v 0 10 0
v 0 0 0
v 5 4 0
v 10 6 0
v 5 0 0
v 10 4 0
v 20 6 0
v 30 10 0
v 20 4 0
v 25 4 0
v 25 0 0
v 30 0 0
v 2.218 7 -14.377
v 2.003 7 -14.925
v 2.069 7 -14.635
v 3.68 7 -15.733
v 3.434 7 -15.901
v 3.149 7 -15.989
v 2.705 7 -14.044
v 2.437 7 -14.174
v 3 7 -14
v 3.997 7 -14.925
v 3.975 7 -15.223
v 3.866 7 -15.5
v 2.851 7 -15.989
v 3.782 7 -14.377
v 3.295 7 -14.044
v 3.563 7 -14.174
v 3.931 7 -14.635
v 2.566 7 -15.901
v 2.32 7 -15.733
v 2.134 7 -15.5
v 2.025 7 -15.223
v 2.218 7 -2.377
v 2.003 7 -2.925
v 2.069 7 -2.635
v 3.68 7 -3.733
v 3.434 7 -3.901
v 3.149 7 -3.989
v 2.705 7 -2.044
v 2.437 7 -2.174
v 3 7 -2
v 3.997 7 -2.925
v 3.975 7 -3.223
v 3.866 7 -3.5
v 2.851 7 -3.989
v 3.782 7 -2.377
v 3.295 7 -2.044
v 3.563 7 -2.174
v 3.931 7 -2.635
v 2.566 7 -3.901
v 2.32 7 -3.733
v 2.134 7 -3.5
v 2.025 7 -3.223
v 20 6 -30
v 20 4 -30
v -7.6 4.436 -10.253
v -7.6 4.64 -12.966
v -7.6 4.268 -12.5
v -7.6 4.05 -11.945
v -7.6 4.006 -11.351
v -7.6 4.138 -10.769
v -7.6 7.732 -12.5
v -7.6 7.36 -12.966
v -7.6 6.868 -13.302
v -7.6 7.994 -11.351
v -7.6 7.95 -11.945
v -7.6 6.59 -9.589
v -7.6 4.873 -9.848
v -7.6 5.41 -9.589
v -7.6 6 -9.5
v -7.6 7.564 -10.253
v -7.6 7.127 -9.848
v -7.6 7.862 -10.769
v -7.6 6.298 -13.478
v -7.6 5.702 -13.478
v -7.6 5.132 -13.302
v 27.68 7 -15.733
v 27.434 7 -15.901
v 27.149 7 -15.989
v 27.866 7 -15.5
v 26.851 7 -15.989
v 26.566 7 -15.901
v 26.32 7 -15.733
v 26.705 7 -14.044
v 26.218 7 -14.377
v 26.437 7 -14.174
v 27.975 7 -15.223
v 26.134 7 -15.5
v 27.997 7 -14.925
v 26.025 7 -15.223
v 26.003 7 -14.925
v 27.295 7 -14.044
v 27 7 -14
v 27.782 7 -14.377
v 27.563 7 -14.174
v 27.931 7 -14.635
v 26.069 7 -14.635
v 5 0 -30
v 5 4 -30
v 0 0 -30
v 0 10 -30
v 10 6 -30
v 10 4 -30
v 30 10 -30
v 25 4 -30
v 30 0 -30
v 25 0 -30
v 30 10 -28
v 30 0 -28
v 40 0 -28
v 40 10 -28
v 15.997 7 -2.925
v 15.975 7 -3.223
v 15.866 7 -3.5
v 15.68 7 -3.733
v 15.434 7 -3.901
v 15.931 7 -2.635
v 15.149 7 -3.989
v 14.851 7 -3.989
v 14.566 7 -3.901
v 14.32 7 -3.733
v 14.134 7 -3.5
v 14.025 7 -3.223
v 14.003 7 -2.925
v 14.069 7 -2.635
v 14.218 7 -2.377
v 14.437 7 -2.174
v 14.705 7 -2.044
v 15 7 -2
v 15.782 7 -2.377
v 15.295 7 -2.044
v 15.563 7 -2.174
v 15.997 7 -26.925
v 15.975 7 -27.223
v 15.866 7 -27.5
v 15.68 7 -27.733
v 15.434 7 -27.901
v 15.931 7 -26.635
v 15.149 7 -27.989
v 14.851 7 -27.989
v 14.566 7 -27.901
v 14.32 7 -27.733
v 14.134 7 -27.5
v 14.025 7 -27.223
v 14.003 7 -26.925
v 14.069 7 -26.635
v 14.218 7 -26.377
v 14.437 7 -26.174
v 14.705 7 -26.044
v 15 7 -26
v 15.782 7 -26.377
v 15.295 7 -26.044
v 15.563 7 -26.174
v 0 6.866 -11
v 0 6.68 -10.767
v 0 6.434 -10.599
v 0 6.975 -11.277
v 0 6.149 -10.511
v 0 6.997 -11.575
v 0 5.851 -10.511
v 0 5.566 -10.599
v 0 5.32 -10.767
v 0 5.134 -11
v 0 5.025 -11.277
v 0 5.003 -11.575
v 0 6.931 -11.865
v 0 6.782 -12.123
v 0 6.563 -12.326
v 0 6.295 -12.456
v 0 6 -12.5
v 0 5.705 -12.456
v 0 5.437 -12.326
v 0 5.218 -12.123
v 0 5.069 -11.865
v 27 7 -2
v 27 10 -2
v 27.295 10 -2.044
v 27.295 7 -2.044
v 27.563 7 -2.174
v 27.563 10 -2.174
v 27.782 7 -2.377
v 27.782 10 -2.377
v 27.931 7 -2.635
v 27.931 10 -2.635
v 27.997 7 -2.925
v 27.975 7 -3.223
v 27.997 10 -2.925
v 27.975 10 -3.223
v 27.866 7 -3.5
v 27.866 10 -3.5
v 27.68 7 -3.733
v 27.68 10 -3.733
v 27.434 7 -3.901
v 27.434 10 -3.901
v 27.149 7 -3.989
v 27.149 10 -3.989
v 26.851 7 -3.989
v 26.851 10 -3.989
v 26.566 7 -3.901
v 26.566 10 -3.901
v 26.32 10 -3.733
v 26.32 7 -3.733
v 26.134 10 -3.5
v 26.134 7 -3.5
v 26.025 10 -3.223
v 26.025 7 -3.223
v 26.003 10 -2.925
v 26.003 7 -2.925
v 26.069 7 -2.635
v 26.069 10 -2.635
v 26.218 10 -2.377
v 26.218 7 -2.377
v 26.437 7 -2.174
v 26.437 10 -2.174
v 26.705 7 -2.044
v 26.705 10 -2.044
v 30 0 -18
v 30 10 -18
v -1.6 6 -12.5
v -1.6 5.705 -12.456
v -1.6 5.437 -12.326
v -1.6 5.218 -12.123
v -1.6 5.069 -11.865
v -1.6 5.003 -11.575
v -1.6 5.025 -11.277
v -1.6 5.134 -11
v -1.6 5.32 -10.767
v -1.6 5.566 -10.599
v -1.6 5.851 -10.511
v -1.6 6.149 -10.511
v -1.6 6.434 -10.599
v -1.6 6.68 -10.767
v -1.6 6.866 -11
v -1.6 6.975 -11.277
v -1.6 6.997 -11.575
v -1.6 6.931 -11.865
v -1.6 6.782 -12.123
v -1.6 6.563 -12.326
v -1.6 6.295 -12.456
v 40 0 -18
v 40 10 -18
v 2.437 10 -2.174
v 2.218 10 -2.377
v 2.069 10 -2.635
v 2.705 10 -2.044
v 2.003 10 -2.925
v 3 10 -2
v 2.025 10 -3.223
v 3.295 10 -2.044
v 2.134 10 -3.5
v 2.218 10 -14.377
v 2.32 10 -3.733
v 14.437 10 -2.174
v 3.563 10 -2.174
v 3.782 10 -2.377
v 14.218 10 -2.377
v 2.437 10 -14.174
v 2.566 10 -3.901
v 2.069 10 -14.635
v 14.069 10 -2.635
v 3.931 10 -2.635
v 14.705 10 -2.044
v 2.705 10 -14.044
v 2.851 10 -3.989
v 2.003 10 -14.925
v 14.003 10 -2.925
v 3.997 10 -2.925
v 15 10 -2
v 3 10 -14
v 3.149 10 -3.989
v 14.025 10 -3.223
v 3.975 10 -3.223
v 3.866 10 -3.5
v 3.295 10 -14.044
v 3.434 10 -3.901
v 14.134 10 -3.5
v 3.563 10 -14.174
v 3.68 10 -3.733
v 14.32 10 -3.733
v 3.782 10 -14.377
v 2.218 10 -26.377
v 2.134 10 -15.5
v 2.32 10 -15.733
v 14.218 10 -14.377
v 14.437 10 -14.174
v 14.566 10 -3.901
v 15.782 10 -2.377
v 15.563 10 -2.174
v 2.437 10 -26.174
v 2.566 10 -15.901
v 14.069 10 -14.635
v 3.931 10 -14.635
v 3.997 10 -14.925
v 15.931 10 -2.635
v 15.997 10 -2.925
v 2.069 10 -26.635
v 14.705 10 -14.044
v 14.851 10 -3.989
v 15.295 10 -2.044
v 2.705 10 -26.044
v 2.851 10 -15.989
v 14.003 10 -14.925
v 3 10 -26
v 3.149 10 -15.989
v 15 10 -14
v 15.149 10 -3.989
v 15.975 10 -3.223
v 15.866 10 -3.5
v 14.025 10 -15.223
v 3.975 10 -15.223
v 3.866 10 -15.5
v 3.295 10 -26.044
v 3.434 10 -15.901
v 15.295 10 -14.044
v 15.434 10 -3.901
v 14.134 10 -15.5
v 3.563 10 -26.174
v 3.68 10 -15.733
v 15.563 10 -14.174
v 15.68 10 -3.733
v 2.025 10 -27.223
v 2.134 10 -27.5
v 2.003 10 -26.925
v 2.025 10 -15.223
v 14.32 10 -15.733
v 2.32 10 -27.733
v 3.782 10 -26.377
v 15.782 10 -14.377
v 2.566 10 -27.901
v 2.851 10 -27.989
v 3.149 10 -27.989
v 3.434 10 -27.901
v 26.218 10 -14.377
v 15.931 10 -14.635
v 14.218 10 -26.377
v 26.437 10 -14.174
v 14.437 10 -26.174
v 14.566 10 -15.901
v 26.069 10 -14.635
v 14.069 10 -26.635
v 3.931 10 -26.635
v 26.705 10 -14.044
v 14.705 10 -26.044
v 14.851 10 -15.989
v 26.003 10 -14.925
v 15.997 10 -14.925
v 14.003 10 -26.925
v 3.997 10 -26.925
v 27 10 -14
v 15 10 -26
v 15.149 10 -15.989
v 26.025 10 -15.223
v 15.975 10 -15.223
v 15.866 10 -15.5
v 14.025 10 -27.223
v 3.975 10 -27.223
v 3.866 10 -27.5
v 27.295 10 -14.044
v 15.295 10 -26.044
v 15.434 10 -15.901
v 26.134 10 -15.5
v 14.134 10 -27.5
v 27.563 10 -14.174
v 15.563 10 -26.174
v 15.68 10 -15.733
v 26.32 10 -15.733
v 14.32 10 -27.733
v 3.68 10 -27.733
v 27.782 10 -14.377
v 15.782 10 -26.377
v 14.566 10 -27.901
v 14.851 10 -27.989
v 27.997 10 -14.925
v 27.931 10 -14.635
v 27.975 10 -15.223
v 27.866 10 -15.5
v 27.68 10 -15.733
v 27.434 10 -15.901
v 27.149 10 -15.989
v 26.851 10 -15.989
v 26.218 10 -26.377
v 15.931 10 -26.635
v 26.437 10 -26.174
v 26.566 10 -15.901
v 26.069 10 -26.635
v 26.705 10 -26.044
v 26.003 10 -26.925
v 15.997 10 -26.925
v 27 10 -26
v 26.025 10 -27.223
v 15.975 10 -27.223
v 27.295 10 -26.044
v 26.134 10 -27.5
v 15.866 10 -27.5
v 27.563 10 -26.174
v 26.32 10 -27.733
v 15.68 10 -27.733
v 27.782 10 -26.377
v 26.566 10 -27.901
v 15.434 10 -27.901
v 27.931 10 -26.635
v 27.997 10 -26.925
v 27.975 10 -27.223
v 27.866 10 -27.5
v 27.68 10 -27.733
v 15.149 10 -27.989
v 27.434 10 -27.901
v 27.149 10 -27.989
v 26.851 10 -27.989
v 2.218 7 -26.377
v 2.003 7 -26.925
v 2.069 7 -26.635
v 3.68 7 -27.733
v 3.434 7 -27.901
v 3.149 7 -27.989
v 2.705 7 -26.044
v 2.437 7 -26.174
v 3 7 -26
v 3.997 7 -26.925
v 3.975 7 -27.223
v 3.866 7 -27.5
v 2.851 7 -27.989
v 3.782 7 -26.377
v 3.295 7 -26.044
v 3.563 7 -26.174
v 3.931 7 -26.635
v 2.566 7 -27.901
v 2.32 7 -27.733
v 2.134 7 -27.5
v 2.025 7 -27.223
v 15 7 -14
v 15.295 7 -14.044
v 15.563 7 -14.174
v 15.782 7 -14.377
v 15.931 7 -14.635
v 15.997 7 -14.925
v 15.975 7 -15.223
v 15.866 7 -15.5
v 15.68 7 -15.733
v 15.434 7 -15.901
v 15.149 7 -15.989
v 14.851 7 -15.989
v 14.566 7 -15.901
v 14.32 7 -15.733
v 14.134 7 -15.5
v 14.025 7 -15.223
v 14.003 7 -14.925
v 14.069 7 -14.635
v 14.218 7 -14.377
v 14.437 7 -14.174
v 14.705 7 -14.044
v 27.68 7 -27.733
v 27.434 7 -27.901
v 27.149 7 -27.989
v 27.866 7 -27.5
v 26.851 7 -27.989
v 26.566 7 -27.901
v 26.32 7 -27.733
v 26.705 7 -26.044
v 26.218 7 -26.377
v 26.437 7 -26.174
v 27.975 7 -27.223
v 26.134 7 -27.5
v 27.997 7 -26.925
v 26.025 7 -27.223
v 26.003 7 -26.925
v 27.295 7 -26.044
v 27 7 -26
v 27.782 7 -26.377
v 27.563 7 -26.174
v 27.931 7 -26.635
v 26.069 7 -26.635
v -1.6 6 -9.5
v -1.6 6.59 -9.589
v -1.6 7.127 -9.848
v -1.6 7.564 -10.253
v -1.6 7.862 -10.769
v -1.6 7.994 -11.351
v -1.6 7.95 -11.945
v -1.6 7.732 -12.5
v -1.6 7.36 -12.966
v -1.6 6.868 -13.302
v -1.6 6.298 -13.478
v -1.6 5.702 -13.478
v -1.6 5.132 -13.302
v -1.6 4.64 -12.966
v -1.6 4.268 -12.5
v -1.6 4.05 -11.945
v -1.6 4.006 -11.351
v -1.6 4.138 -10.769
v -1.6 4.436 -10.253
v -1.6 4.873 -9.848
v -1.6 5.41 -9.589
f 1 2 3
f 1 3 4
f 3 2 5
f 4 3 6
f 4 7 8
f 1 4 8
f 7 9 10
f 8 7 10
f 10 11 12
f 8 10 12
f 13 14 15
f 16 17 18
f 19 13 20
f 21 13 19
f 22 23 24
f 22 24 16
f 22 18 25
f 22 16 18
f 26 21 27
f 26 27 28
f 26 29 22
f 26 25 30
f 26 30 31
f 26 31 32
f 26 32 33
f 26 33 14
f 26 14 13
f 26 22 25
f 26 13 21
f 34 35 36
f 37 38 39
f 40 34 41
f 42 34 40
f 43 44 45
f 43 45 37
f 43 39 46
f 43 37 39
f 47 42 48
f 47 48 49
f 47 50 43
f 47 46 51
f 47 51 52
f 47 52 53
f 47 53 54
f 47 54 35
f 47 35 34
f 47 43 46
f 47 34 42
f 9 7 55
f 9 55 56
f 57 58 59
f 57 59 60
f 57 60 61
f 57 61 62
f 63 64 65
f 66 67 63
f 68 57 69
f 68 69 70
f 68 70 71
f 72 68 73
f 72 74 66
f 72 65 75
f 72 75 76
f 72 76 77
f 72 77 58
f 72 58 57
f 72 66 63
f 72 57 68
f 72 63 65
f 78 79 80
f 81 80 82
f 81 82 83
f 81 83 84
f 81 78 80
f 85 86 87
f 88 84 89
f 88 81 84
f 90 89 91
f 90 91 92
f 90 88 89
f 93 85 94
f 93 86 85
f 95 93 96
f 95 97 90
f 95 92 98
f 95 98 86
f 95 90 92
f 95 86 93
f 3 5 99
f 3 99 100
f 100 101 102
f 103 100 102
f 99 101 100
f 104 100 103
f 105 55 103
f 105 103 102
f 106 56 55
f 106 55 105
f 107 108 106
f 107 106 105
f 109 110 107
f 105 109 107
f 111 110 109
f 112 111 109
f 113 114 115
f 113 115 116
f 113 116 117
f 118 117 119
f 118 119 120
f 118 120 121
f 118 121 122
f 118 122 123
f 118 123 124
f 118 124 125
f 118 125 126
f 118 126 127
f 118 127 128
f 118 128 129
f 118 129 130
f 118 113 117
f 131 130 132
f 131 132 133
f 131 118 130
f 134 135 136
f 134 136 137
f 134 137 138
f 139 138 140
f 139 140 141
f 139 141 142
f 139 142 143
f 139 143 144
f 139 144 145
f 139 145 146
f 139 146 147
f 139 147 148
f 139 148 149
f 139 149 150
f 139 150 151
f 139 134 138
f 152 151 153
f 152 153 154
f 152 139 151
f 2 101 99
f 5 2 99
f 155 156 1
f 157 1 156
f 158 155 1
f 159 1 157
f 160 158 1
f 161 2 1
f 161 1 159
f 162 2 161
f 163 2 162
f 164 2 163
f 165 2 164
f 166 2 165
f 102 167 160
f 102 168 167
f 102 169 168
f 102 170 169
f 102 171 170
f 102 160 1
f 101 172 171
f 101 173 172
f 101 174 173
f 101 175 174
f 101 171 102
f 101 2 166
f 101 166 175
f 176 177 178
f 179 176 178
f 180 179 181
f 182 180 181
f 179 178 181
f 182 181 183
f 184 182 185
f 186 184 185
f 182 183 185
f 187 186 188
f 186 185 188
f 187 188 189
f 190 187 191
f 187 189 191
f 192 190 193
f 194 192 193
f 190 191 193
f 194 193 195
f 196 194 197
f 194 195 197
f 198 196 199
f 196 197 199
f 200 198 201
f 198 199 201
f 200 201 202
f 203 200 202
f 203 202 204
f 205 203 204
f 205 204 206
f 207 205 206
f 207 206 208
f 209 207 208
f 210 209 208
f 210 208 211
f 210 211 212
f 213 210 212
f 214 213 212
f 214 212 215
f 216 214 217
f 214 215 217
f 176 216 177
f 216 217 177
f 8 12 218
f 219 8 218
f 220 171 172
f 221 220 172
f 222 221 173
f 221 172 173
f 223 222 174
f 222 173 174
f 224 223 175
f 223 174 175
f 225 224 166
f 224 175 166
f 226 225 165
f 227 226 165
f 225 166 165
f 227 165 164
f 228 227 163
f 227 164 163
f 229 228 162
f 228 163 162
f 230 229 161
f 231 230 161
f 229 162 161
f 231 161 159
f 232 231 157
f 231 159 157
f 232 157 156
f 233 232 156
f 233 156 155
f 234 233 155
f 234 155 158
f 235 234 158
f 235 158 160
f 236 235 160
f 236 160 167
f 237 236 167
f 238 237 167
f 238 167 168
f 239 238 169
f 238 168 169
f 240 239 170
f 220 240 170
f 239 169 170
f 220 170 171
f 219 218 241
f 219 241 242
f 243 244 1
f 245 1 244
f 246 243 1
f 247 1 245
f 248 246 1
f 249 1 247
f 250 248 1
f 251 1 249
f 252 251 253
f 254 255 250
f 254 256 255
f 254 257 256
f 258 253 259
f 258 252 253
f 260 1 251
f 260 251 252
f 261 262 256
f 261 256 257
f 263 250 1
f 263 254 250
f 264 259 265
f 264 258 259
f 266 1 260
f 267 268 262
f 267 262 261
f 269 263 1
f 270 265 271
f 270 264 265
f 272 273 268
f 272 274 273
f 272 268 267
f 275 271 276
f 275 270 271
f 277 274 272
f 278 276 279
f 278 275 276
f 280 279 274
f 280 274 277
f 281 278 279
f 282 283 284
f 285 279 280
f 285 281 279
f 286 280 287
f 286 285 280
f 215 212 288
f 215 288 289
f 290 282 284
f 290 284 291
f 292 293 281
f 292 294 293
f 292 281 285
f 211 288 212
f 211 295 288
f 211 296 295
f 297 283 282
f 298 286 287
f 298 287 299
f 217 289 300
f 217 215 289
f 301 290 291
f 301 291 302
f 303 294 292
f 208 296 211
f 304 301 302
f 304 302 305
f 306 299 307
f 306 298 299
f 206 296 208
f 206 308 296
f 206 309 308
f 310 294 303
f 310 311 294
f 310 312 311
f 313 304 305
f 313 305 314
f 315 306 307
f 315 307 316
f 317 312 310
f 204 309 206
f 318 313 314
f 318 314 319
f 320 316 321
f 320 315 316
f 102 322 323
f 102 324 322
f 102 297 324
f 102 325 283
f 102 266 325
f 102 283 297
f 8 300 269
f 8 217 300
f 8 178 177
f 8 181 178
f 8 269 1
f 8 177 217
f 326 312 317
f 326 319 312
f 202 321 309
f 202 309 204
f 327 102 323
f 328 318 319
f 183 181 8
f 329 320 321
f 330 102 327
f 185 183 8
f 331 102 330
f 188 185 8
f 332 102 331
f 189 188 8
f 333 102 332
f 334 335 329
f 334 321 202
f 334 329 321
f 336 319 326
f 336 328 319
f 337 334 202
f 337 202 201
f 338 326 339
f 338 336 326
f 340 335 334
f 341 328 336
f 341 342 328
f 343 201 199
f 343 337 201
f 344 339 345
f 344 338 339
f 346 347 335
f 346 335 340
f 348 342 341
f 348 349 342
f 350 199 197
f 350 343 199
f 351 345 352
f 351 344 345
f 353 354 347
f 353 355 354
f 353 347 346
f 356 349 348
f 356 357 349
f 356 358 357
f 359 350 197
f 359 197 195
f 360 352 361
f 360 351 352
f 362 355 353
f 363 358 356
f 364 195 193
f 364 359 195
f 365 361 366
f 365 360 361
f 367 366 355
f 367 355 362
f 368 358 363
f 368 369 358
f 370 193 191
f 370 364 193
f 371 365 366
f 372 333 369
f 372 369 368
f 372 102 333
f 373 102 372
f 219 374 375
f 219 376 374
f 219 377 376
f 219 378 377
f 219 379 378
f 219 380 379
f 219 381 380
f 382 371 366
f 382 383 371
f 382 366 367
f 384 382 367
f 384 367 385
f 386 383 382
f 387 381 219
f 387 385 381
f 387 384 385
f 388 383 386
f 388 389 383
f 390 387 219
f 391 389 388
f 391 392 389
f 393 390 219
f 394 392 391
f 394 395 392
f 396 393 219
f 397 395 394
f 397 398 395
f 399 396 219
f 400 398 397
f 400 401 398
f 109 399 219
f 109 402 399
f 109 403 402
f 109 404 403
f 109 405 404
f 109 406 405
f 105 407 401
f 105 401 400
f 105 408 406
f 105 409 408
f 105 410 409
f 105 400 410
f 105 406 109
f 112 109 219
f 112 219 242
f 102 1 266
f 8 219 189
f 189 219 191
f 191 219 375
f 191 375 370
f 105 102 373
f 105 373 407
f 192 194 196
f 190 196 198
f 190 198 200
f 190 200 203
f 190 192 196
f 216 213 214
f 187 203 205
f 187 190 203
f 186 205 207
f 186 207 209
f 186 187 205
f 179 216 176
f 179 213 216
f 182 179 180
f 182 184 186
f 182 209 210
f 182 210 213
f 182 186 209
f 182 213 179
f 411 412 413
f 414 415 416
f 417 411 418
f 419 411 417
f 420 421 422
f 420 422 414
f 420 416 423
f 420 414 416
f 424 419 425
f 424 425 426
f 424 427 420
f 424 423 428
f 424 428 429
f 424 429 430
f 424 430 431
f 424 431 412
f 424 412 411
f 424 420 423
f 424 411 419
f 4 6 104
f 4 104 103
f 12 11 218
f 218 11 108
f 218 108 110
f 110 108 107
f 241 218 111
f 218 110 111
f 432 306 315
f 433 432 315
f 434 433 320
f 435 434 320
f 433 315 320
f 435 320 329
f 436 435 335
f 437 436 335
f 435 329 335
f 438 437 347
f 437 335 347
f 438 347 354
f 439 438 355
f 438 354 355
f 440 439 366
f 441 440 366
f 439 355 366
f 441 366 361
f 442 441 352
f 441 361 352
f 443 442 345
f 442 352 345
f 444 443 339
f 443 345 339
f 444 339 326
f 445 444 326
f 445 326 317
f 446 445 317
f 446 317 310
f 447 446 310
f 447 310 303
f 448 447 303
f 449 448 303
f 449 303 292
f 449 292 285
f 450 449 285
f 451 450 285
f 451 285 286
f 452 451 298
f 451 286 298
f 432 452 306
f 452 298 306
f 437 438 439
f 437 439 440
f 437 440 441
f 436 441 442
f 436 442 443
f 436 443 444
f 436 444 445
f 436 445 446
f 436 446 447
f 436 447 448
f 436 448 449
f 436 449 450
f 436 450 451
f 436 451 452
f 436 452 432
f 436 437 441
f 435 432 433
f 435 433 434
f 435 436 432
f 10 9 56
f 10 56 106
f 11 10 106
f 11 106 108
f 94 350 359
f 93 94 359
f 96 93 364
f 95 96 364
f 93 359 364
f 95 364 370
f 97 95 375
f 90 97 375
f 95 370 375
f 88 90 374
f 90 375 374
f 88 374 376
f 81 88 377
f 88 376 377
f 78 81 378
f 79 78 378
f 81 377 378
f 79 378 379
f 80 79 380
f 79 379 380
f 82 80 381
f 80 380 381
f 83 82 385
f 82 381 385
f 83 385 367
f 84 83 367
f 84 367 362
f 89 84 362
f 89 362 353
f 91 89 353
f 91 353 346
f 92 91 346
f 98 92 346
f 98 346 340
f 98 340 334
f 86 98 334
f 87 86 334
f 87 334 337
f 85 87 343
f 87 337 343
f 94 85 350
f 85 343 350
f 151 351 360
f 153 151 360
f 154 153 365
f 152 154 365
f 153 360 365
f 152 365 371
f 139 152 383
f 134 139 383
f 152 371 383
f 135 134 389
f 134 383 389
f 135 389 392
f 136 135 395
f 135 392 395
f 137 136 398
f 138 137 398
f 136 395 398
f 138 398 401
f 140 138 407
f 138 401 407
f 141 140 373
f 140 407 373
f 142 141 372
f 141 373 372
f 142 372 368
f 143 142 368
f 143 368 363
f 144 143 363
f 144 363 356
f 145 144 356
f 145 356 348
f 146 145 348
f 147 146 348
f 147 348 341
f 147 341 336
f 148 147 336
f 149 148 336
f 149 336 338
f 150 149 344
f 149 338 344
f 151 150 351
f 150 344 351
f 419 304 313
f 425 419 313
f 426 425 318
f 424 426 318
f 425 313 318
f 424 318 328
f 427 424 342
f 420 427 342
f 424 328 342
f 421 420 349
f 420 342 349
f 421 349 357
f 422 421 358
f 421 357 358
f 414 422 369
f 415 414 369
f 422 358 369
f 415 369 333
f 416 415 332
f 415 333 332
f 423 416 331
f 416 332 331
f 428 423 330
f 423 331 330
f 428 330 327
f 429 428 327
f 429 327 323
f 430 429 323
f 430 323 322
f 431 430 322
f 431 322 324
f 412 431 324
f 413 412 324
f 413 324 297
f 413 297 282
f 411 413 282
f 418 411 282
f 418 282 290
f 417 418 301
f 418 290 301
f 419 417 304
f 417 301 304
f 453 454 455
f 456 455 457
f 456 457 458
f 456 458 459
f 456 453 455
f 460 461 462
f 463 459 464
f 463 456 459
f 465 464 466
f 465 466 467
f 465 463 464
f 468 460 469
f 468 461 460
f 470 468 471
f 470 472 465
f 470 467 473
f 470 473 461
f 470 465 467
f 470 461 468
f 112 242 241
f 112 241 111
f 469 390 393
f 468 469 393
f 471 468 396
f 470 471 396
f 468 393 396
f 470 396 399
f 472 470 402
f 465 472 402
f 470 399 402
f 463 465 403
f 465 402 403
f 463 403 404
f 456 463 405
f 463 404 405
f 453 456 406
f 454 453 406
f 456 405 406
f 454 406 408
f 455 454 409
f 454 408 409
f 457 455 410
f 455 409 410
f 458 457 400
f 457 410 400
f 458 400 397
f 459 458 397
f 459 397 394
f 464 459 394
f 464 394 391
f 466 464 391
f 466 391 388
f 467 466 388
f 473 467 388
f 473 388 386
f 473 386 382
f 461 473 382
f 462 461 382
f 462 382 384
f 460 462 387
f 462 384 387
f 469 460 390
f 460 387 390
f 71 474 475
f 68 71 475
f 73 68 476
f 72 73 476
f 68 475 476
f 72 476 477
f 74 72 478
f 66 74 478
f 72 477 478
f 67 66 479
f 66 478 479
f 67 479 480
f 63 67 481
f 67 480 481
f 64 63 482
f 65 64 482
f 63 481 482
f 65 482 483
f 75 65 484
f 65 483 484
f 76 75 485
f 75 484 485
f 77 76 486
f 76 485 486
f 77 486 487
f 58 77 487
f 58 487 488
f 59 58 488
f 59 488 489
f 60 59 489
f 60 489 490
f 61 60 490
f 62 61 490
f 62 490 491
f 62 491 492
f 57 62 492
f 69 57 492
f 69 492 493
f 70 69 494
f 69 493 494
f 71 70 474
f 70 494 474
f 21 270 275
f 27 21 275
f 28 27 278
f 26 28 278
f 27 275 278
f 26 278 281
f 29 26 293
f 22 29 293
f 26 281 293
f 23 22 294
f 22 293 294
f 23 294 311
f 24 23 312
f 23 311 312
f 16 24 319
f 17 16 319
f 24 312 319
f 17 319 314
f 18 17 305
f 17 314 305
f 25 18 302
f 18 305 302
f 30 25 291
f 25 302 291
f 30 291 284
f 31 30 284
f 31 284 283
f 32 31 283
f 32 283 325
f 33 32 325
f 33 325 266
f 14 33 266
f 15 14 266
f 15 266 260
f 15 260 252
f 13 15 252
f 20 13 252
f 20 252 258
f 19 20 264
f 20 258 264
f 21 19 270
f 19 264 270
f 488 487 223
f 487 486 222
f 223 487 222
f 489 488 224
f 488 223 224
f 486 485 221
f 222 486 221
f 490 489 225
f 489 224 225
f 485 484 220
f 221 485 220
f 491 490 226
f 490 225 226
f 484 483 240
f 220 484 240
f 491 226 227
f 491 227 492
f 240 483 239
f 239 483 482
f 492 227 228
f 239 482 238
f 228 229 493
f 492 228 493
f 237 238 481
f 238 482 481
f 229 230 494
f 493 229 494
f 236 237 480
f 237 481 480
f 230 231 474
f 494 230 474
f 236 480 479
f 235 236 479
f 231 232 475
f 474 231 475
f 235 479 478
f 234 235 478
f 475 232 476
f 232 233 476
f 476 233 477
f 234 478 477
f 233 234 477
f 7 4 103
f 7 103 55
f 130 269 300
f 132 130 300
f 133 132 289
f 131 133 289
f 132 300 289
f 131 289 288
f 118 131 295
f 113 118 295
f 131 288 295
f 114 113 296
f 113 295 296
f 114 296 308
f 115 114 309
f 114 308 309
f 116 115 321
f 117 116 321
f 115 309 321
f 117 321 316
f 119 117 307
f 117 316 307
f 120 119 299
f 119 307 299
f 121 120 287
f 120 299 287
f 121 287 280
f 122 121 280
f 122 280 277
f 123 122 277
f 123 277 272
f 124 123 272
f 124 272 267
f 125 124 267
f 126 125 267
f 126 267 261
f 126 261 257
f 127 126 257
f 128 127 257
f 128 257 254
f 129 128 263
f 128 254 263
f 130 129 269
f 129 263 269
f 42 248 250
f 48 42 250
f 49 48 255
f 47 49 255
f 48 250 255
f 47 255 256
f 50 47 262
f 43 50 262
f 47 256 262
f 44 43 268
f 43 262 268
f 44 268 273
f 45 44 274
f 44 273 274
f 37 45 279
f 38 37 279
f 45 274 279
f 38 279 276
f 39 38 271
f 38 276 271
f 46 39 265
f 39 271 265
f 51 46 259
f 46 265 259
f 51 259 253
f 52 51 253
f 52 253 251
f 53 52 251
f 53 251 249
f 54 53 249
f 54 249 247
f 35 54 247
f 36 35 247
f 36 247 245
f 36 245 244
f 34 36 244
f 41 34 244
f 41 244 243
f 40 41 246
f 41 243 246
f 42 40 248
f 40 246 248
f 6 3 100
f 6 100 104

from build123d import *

# Parameters (mm, degrees)
SKETCH_1_W          = 30
SKETCH_1_H          = 30
EXTRUDE_1_DEPTH     = 10
CUT_EXTRUDE_1_DEPTH = 44.588989435
SKETCH_3_R          = 1
CUT_EXTRUDE_2_DEPTH = 3
SKETCH_4_W          = 10
SKETCH_4_H          = 10
EXTRUDE_2_DEPTH     = 10
SKETCH_5_R          = 1
EXTRUDE_3_DEPTH     = 1.6
SKETCH_6_R          = 2
EXTRUDE_4_DEPTH     = 6


with BuildPart() as part:
    # Эскиз1 → Бобышка-Вытянуть1 (new body)
    with BuildSketch(Plane(origin=(0, 0, 0), x_dir=(1, 0, 0), z_dir=(0, 1, 0))):
        with Locations((15, 15)):
            Rectangle(SKETCH_1_W, SKETCH_1_H)
    extrude(amount=EXTRUDE_1_DEPTH)

    # Эскиз2 → Вырез-Вытянуть1 (cut, through all)
    with BuildSketch(Plane.XY):
        Polygon((5, 0), (5, 4), (10, 4), (10, 6), (20, 6), (20, 4), (25, 4), (25, 0), align=None)
    extrude(amount=-CUT_EXTRUDE_1_DEPTH, mode=Mode.SUBTRACT)

    # Эскиз3 → Вырез-Вытянуть2 (cut)
    with BuildSketch(Plane(origin=(0, 10, 0), x_dir=(1, 0, 0), z_dir=(0, 1, 0))):
        with Locations(Location((3, 27, 0), (0, 0, 270))):
            Circle(SKETCH_3_R)
        with Locations(Location((15, 27, 0), (0, 0, 270))):
            Circle(SKETCH_3_R)
        with Locations(Location((27, 27, 0), (0, 0, 270))):
            Circle(SKETCH_3_R)
        with Locations(Location((27, 15, 0), (0, 0, 270))):
            Circle(SKETCH_3_R)
        with Locations(Location((27, 3, 0), (0, 0, 270))):
            Circle(SKETCH_3_R)
        with Locations(Location((15, 3, 0), (0, 0, 270))):
            Circle(SKETCH_3_R)
        with Locations(Location((3, 3, 0), (0, 0, 270))):
            Circle(SKETCH_3_R)
        with Locations(Location((3, 15, 0), (0, 0, 270))):
            Circle(SKETCH_3_R)
        with Locations(Location((15, 15, 0), (0, 0, 270))):
            Circle(SKETCH_3_R)
    extrude(amount=-CUT_EXTRUDE_2_DEPTH, mode=Mode.SUBTRACT)

    # Эскиз4 → Бобышка-Вытянуть2 (add)
    with BuildSketch(Plane(origin=(30, 0, 0), x_dir=(0, 0, -1), z_dir=(1, 0, 0))):
        with Locations((23, 5)):
            Rectangle(SKETCH_4_W, SKETCH_4_H)
    extrude(amount=EXTRUDE_2_DEPTH)

    # Эскиз5 → Бобышка-Вытянуть3 (add)
    with BuildSketch(Plane.ZY):
        with Locations(Location((-11.5, 6, 0), (0, 0, 180))):
            Circle(SKETCH_5_R)
    extrude(amount=EXTRUDE_3_DEPTH)

    # Эскиз6 → Бобышка-Вытянуть4 (add)
    with BuildSketch(Plane.ZY.offset(1.6)):
        with Locations((-11.5, 6)):
            Circle(SKETCH_6_R)
    extrude(amount=EXTRUDE_4_DEPTH)


solid = part.part
